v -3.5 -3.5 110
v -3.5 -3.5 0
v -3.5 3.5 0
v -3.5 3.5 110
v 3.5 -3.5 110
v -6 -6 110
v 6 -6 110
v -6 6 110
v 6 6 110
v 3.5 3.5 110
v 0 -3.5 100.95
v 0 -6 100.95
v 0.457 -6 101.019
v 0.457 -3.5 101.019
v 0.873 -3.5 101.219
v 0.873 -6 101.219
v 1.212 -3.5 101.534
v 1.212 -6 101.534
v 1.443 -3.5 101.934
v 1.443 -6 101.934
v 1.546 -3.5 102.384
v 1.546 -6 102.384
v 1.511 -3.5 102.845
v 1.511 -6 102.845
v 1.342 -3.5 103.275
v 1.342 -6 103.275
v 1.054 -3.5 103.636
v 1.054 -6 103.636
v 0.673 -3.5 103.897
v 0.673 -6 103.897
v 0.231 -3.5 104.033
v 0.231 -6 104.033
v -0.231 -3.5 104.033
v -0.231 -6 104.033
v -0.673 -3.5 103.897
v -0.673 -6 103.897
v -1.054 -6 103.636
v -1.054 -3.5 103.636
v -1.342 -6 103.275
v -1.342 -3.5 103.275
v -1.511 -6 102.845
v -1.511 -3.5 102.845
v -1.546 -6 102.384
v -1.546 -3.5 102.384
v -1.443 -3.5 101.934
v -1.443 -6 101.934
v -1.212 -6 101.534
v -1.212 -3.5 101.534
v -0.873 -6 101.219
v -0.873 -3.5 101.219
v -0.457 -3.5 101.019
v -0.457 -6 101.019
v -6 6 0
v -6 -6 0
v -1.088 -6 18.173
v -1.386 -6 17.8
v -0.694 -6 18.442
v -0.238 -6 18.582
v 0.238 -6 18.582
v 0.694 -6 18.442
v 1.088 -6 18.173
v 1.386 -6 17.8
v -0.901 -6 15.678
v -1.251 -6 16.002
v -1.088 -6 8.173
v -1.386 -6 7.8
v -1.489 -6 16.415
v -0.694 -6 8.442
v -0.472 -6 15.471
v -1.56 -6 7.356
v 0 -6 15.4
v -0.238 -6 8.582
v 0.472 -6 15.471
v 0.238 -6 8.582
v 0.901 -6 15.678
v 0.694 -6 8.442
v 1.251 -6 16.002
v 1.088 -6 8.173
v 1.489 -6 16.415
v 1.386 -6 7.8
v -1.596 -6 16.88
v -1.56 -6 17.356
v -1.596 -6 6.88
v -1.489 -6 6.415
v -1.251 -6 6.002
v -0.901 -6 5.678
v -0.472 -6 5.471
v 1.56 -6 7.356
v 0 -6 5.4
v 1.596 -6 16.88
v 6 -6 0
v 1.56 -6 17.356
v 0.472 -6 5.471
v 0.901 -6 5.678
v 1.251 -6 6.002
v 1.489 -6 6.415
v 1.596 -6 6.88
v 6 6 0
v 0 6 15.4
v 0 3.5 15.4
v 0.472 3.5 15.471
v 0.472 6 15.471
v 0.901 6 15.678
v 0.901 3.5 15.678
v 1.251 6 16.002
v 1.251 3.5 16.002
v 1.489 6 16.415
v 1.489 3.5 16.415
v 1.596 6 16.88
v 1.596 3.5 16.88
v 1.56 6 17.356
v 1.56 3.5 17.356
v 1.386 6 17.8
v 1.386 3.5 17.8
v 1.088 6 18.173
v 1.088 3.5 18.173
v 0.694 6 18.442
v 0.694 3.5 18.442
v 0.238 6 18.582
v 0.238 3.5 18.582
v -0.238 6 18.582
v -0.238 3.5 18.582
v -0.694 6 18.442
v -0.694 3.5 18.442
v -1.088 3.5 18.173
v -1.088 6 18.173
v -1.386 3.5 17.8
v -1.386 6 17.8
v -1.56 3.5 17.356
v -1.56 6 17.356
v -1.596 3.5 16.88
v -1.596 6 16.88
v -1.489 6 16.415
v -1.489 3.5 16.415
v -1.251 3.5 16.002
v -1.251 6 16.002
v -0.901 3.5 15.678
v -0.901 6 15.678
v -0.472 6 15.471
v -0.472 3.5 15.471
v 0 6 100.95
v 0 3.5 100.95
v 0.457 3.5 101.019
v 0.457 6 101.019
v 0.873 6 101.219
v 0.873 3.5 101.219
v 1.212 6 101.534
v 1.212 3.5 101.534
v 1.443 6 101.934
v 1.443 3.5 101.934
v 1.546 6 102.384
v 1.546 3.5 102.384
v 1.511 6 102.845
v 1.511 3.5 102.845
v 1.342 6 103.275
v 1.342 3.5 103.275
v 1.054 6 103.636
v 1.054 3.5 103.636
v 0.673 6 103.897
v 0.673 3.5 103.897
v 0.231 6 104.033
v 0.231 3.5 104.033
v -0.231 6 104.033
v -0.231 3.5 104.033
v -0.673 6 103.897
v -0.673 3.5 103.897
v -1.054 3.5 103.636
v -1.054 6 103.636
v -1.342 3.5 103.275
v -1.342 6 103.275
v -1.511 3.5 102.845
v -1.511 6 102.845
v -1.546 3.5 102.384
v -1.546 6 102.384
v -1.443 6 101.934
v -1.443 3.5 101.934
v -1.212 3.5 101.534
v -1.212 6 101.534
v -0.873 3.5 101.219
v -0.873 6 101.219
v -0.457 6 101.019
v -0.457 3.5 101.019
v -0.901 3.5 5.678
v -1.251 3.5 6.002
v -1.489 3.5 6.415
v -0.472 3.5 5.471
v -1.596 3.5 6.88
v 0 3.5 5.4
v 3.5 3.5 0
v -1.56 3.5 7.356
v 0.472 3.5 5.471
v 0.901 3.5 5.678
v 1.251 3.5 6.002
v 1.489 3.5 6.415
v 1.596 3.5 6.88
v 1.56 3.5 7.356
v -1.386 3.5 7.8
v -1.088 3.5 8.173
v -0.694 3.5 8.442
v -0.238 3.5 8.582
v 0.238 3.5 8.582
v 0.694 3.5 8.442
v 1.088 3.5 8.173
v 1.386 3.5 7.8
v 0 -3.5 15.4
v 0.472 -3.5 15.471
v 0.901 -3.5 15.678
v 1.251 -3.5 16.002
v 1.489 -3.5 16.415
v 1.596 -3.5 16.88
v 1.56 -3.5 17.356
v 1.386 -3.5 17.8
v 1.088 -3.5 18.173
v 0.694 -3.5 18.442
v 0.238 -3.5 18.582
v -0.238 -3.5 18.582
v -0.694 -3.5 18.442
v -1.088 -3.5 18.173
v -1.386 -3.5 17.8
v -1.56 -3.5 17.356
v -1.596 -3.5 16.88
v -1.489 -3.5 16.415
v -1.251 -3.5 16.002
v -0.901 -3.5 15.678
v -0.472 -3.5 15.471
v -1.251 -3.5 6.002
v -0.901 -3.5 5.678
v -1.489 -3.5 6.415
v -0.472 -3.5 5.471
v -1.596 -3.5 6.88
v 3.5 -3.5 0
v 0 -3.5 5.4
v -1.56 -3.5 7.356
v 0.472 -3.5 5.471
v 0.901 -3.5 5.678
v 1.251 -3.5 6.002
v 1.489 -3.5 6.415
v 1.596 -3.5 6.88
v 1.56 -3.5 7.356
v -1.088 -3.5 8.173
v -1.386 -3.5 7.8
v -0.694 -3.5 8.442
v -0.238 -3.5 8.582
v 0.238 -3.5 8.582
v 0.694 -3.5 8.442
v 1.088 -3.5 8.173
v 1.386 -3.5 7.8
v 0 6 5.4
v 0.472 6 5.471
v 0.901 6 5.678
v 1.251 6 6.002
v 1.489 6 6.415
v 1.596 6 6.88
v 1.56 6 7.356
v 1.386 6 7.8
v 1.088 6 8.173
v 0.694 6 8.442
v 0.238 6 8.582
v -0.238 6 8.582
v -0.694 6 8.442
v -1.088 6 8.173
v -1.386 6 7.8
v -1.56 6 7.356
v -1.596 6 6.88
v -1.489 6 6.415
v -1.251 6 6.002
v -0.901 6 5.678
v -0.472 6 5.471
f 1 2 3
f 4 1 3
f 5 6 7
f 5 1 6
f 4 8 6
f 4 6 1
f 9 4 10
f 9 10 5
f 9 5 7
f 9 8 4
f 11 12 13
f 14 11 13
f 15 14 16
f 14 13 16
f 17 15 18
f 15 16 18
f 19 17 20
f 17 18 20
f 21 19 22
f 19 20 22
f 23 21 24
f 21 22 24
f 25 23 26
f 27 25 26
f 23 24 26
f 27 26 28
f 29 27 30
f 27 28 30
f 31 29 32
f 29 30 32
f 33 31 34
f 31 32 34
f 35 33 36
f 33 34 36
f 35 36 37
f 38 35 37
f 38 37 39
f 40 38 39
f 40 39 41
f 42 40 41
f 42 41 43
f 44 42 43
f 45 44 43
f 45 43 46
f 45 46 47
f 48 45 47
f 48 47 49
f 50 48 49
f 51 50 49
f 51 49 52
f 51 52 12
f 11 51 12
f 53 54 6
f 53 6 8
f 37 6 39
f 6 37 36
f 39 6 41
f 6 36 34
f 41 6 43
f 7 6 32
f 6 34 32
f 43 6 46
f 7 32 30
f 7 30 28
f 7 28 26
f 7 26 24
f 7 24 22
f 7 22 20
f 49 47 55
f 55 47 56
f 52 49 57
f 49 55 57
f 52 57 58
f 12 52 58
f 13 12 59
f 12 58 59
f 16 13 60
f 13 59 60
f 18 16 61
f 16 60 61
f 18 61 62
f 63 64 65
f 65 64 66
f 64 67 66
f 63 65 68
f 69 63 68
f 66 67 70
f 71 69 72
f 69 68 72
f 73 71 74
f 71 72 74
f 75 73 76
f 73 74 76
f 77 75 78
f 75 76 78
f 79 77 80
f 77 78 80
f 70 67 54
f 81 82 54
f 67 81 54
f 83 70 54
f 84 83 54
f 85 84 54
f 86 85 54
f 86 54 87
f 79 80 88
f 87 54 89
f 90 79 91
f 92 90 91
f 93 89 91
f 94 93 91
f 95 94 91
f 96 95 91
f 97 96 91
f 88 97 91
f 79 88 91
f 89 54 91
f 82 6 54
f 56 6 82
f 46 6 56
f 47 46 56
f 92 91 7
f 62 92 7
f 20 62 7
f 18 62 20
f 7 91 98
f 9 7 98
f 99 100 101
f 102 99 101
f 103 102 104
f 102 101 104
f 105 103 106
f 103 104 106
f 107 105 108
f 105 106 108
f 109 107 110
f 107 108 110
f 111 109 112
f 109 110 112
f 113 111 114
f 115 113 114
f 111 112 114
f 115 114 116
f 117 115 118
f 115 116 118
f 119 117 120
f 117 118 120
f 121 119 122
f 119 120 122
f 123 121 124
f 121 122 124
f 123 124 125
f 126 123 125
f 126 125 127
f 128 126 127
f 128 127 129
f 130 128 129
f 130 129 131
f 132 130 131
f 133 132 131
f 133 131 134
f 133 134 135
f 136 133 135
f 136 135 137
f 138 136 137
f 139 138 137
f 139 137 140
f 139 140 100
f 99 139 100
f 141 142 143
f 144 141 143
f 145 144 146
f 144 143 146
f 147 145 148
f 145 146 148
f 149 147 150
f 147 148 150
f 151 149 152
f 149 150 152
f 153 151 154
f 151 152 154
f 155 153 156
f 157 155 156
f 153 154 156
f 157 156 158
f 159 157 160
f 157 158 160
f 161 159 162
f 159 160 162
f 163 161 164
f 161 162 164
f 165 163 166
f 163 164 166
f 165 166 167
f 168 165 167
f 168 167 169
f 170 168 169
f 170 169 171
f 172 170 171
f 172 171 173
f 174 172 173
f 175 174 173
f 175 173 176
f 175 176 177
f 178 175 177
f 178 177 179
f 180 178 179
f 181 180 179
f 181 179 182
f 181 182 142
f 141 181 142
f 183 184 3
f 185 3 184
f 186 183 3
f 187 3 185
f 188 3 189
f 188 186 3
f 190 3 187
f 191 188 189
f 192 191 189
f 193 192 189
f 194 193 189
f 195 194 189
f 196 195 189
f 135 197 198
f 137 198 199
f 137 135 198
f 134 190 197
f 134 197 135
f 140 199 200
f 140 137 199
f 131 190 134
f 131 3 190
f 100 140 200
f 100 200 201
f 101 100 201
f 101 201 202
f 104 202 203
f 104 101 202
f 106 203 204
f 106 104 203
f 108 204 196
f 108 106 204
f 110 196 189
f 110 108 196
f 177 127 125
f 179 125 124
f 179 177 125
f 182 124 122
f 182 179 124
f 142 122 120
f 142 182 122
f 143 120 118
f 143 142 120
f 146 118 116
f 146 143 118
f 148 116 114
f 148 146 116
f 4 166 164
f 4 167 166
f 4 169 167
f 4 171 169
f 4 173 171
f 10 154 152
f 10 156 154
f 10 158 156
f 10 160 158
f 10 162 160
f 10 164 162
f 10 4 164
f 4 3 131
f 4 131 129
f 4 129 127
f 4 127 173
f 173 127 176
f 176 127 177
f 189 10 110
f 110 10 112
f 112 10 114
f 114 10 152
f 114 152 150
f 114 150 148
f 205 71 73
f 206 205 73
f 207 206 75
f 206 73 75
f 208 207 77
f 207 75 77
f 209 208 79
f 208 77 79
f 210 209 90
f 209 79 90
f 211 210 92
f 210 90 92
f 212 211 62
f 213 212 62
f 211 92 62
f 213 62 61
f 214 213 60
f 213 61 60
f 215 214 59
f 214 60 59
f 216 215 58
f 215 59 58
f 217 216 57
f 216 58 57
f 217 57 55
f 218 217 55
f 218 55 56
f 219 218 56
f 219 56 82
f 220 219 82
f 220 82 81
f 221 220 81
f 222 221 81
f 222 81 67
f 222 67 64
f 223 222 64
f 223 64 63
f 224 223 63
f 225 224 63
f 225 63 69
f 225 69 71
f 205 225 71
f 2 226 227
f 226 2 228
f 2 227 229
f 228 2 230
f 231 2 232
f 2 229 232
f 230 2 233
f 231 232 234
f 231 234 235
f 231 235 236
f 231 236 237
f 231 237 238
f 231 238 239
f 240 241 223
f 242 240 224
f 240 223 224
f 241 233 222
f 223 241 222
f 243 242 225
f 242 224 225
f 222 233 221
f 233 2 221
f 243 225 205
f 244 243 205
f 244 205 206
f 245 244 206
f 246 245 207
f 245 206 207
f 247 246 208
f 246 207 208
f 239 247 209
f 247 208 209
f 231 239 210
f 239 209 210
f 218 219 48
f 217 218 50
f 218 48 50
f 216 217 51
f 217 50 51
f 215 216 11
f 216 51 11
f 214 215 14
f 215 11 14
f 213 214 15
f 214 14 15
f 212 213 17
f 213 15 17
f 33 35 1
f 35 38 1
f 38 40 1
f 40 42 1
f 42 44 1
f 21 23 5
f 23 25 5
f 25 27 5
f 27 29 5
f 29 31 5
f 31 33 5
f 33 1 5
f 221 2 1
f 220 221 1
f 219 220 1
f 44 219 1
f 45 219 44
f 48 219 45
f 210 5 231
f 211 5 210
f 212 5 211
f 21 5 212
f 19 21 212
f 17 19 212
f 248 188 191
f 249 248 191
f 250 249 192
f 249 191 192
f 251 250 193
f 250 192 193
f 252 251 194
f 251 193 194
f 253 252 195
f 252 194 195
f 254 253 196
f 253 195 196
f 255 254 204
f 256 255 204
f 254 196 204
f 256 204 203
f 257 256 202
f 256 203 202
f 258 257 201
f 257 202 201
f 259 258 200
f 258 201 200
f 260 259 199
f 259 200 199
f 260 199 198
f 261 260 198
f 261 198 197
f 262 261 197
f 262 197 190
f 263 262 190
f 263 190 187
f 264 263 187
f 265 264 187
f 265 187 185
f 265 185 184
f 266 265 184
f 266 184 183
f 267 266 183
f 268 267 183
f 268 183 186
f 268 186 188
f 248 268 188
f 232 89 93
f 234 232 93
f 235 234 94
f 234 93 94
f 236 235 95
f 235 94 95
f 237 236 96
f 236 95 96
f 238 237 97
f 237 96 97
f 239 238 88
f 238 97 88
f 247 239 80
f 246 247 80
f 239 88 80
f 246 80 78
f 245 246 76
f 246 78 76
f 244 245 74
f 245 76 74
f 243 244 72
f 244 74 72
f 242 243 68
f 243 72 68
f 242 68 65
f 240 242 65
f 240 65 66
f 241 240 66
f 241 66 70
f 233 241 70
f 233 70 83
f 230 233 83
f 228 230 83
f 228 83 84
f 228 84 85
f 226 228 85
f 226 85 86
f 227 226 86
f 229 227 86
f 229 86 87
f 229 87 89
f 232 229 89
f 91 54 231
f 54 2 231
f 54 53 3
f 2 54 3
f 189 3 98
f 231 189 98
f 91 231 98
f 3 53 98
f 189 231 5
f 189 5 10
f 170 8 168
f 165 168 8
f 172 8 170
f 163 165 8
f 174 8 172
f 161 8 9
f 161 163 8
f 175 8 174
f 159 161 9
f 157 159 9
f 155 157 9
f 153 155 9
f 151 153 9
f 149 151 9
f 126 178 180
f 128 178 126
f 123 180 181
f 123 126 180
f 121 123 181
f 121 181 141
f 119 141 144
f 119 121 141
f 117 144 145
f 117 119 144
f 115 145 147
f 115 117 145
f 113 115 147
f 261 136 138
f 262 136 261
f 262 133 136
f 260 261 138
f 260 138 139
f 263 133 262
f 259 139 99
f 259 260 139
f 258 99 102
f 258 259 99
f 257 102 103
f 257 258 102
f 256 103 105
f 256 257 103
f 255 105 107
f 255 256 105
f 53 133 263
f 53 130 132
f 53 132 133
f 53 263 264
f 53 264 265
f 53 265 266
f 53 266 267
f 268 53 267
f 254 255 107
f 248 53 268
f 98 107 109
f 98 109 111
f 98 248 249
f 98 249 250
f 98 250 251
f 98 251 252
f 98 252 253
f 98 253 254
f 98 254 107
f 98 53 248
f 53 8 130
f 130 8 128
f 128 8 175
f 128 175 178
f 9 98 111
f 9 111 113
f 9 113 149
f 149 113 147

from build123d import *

# Parameters (mm, degrees)
SKETCH_1_W          = 12
SKETCH_1_H          = 12
EXTRUDE_1_DEPTH     = 110
SKETCH_2_W          = 7
SKETCH_2_H          = 7
CUT_EXTRUDE_1_DEPTH = 111.326787318
SKETCH_3_R          = 1.6
SKETCH_3_R_2        = 1.55
CUT_EXTRUDE_2_DEPTH = 111.815161418


with BuildPart() as part:
    # 草图1 → 凸台-拉伸1 (new body)
    with BuildSketch(Plane.XY):
        Rectangle(SKETCH_1_W, SKETCH_1_H)
    extrude(amount=EXTRUDE_1_DEPTH)

    # 草图2 → 切除-拉伸1 (cut, through all)
    with BuildSketch(Plane.XY.offset(110)):
        Rectangle(SKETCH_2_W, SKETCH_2_H)
    extrude(amount=-CUT_EXTRUDE_1_DEPTH, mode=Mode.SUBTRACT)

    # 草图3 → 切除-拉伸2 (cut, through all)
    with BuildSketch(Plane.XZ.offset(6)):
        with Locations(Location((0, 7, 0), (0, 0, 270))):
            Circle(SKETCH_3_R)
        with Locations(Location((0, 17, 0), (0, 0, 270))):
            Circle(SKETCH_3_R)
        with Locations(Location((0, 102.5, 0), (0, 0, 270))):
            Circle(SKETCH_3_R_2)
    extrude(amount=-CUT_EXTRUDE_2_DEPTH, mode=Mode.SUBTRACT)


solid = part.part
